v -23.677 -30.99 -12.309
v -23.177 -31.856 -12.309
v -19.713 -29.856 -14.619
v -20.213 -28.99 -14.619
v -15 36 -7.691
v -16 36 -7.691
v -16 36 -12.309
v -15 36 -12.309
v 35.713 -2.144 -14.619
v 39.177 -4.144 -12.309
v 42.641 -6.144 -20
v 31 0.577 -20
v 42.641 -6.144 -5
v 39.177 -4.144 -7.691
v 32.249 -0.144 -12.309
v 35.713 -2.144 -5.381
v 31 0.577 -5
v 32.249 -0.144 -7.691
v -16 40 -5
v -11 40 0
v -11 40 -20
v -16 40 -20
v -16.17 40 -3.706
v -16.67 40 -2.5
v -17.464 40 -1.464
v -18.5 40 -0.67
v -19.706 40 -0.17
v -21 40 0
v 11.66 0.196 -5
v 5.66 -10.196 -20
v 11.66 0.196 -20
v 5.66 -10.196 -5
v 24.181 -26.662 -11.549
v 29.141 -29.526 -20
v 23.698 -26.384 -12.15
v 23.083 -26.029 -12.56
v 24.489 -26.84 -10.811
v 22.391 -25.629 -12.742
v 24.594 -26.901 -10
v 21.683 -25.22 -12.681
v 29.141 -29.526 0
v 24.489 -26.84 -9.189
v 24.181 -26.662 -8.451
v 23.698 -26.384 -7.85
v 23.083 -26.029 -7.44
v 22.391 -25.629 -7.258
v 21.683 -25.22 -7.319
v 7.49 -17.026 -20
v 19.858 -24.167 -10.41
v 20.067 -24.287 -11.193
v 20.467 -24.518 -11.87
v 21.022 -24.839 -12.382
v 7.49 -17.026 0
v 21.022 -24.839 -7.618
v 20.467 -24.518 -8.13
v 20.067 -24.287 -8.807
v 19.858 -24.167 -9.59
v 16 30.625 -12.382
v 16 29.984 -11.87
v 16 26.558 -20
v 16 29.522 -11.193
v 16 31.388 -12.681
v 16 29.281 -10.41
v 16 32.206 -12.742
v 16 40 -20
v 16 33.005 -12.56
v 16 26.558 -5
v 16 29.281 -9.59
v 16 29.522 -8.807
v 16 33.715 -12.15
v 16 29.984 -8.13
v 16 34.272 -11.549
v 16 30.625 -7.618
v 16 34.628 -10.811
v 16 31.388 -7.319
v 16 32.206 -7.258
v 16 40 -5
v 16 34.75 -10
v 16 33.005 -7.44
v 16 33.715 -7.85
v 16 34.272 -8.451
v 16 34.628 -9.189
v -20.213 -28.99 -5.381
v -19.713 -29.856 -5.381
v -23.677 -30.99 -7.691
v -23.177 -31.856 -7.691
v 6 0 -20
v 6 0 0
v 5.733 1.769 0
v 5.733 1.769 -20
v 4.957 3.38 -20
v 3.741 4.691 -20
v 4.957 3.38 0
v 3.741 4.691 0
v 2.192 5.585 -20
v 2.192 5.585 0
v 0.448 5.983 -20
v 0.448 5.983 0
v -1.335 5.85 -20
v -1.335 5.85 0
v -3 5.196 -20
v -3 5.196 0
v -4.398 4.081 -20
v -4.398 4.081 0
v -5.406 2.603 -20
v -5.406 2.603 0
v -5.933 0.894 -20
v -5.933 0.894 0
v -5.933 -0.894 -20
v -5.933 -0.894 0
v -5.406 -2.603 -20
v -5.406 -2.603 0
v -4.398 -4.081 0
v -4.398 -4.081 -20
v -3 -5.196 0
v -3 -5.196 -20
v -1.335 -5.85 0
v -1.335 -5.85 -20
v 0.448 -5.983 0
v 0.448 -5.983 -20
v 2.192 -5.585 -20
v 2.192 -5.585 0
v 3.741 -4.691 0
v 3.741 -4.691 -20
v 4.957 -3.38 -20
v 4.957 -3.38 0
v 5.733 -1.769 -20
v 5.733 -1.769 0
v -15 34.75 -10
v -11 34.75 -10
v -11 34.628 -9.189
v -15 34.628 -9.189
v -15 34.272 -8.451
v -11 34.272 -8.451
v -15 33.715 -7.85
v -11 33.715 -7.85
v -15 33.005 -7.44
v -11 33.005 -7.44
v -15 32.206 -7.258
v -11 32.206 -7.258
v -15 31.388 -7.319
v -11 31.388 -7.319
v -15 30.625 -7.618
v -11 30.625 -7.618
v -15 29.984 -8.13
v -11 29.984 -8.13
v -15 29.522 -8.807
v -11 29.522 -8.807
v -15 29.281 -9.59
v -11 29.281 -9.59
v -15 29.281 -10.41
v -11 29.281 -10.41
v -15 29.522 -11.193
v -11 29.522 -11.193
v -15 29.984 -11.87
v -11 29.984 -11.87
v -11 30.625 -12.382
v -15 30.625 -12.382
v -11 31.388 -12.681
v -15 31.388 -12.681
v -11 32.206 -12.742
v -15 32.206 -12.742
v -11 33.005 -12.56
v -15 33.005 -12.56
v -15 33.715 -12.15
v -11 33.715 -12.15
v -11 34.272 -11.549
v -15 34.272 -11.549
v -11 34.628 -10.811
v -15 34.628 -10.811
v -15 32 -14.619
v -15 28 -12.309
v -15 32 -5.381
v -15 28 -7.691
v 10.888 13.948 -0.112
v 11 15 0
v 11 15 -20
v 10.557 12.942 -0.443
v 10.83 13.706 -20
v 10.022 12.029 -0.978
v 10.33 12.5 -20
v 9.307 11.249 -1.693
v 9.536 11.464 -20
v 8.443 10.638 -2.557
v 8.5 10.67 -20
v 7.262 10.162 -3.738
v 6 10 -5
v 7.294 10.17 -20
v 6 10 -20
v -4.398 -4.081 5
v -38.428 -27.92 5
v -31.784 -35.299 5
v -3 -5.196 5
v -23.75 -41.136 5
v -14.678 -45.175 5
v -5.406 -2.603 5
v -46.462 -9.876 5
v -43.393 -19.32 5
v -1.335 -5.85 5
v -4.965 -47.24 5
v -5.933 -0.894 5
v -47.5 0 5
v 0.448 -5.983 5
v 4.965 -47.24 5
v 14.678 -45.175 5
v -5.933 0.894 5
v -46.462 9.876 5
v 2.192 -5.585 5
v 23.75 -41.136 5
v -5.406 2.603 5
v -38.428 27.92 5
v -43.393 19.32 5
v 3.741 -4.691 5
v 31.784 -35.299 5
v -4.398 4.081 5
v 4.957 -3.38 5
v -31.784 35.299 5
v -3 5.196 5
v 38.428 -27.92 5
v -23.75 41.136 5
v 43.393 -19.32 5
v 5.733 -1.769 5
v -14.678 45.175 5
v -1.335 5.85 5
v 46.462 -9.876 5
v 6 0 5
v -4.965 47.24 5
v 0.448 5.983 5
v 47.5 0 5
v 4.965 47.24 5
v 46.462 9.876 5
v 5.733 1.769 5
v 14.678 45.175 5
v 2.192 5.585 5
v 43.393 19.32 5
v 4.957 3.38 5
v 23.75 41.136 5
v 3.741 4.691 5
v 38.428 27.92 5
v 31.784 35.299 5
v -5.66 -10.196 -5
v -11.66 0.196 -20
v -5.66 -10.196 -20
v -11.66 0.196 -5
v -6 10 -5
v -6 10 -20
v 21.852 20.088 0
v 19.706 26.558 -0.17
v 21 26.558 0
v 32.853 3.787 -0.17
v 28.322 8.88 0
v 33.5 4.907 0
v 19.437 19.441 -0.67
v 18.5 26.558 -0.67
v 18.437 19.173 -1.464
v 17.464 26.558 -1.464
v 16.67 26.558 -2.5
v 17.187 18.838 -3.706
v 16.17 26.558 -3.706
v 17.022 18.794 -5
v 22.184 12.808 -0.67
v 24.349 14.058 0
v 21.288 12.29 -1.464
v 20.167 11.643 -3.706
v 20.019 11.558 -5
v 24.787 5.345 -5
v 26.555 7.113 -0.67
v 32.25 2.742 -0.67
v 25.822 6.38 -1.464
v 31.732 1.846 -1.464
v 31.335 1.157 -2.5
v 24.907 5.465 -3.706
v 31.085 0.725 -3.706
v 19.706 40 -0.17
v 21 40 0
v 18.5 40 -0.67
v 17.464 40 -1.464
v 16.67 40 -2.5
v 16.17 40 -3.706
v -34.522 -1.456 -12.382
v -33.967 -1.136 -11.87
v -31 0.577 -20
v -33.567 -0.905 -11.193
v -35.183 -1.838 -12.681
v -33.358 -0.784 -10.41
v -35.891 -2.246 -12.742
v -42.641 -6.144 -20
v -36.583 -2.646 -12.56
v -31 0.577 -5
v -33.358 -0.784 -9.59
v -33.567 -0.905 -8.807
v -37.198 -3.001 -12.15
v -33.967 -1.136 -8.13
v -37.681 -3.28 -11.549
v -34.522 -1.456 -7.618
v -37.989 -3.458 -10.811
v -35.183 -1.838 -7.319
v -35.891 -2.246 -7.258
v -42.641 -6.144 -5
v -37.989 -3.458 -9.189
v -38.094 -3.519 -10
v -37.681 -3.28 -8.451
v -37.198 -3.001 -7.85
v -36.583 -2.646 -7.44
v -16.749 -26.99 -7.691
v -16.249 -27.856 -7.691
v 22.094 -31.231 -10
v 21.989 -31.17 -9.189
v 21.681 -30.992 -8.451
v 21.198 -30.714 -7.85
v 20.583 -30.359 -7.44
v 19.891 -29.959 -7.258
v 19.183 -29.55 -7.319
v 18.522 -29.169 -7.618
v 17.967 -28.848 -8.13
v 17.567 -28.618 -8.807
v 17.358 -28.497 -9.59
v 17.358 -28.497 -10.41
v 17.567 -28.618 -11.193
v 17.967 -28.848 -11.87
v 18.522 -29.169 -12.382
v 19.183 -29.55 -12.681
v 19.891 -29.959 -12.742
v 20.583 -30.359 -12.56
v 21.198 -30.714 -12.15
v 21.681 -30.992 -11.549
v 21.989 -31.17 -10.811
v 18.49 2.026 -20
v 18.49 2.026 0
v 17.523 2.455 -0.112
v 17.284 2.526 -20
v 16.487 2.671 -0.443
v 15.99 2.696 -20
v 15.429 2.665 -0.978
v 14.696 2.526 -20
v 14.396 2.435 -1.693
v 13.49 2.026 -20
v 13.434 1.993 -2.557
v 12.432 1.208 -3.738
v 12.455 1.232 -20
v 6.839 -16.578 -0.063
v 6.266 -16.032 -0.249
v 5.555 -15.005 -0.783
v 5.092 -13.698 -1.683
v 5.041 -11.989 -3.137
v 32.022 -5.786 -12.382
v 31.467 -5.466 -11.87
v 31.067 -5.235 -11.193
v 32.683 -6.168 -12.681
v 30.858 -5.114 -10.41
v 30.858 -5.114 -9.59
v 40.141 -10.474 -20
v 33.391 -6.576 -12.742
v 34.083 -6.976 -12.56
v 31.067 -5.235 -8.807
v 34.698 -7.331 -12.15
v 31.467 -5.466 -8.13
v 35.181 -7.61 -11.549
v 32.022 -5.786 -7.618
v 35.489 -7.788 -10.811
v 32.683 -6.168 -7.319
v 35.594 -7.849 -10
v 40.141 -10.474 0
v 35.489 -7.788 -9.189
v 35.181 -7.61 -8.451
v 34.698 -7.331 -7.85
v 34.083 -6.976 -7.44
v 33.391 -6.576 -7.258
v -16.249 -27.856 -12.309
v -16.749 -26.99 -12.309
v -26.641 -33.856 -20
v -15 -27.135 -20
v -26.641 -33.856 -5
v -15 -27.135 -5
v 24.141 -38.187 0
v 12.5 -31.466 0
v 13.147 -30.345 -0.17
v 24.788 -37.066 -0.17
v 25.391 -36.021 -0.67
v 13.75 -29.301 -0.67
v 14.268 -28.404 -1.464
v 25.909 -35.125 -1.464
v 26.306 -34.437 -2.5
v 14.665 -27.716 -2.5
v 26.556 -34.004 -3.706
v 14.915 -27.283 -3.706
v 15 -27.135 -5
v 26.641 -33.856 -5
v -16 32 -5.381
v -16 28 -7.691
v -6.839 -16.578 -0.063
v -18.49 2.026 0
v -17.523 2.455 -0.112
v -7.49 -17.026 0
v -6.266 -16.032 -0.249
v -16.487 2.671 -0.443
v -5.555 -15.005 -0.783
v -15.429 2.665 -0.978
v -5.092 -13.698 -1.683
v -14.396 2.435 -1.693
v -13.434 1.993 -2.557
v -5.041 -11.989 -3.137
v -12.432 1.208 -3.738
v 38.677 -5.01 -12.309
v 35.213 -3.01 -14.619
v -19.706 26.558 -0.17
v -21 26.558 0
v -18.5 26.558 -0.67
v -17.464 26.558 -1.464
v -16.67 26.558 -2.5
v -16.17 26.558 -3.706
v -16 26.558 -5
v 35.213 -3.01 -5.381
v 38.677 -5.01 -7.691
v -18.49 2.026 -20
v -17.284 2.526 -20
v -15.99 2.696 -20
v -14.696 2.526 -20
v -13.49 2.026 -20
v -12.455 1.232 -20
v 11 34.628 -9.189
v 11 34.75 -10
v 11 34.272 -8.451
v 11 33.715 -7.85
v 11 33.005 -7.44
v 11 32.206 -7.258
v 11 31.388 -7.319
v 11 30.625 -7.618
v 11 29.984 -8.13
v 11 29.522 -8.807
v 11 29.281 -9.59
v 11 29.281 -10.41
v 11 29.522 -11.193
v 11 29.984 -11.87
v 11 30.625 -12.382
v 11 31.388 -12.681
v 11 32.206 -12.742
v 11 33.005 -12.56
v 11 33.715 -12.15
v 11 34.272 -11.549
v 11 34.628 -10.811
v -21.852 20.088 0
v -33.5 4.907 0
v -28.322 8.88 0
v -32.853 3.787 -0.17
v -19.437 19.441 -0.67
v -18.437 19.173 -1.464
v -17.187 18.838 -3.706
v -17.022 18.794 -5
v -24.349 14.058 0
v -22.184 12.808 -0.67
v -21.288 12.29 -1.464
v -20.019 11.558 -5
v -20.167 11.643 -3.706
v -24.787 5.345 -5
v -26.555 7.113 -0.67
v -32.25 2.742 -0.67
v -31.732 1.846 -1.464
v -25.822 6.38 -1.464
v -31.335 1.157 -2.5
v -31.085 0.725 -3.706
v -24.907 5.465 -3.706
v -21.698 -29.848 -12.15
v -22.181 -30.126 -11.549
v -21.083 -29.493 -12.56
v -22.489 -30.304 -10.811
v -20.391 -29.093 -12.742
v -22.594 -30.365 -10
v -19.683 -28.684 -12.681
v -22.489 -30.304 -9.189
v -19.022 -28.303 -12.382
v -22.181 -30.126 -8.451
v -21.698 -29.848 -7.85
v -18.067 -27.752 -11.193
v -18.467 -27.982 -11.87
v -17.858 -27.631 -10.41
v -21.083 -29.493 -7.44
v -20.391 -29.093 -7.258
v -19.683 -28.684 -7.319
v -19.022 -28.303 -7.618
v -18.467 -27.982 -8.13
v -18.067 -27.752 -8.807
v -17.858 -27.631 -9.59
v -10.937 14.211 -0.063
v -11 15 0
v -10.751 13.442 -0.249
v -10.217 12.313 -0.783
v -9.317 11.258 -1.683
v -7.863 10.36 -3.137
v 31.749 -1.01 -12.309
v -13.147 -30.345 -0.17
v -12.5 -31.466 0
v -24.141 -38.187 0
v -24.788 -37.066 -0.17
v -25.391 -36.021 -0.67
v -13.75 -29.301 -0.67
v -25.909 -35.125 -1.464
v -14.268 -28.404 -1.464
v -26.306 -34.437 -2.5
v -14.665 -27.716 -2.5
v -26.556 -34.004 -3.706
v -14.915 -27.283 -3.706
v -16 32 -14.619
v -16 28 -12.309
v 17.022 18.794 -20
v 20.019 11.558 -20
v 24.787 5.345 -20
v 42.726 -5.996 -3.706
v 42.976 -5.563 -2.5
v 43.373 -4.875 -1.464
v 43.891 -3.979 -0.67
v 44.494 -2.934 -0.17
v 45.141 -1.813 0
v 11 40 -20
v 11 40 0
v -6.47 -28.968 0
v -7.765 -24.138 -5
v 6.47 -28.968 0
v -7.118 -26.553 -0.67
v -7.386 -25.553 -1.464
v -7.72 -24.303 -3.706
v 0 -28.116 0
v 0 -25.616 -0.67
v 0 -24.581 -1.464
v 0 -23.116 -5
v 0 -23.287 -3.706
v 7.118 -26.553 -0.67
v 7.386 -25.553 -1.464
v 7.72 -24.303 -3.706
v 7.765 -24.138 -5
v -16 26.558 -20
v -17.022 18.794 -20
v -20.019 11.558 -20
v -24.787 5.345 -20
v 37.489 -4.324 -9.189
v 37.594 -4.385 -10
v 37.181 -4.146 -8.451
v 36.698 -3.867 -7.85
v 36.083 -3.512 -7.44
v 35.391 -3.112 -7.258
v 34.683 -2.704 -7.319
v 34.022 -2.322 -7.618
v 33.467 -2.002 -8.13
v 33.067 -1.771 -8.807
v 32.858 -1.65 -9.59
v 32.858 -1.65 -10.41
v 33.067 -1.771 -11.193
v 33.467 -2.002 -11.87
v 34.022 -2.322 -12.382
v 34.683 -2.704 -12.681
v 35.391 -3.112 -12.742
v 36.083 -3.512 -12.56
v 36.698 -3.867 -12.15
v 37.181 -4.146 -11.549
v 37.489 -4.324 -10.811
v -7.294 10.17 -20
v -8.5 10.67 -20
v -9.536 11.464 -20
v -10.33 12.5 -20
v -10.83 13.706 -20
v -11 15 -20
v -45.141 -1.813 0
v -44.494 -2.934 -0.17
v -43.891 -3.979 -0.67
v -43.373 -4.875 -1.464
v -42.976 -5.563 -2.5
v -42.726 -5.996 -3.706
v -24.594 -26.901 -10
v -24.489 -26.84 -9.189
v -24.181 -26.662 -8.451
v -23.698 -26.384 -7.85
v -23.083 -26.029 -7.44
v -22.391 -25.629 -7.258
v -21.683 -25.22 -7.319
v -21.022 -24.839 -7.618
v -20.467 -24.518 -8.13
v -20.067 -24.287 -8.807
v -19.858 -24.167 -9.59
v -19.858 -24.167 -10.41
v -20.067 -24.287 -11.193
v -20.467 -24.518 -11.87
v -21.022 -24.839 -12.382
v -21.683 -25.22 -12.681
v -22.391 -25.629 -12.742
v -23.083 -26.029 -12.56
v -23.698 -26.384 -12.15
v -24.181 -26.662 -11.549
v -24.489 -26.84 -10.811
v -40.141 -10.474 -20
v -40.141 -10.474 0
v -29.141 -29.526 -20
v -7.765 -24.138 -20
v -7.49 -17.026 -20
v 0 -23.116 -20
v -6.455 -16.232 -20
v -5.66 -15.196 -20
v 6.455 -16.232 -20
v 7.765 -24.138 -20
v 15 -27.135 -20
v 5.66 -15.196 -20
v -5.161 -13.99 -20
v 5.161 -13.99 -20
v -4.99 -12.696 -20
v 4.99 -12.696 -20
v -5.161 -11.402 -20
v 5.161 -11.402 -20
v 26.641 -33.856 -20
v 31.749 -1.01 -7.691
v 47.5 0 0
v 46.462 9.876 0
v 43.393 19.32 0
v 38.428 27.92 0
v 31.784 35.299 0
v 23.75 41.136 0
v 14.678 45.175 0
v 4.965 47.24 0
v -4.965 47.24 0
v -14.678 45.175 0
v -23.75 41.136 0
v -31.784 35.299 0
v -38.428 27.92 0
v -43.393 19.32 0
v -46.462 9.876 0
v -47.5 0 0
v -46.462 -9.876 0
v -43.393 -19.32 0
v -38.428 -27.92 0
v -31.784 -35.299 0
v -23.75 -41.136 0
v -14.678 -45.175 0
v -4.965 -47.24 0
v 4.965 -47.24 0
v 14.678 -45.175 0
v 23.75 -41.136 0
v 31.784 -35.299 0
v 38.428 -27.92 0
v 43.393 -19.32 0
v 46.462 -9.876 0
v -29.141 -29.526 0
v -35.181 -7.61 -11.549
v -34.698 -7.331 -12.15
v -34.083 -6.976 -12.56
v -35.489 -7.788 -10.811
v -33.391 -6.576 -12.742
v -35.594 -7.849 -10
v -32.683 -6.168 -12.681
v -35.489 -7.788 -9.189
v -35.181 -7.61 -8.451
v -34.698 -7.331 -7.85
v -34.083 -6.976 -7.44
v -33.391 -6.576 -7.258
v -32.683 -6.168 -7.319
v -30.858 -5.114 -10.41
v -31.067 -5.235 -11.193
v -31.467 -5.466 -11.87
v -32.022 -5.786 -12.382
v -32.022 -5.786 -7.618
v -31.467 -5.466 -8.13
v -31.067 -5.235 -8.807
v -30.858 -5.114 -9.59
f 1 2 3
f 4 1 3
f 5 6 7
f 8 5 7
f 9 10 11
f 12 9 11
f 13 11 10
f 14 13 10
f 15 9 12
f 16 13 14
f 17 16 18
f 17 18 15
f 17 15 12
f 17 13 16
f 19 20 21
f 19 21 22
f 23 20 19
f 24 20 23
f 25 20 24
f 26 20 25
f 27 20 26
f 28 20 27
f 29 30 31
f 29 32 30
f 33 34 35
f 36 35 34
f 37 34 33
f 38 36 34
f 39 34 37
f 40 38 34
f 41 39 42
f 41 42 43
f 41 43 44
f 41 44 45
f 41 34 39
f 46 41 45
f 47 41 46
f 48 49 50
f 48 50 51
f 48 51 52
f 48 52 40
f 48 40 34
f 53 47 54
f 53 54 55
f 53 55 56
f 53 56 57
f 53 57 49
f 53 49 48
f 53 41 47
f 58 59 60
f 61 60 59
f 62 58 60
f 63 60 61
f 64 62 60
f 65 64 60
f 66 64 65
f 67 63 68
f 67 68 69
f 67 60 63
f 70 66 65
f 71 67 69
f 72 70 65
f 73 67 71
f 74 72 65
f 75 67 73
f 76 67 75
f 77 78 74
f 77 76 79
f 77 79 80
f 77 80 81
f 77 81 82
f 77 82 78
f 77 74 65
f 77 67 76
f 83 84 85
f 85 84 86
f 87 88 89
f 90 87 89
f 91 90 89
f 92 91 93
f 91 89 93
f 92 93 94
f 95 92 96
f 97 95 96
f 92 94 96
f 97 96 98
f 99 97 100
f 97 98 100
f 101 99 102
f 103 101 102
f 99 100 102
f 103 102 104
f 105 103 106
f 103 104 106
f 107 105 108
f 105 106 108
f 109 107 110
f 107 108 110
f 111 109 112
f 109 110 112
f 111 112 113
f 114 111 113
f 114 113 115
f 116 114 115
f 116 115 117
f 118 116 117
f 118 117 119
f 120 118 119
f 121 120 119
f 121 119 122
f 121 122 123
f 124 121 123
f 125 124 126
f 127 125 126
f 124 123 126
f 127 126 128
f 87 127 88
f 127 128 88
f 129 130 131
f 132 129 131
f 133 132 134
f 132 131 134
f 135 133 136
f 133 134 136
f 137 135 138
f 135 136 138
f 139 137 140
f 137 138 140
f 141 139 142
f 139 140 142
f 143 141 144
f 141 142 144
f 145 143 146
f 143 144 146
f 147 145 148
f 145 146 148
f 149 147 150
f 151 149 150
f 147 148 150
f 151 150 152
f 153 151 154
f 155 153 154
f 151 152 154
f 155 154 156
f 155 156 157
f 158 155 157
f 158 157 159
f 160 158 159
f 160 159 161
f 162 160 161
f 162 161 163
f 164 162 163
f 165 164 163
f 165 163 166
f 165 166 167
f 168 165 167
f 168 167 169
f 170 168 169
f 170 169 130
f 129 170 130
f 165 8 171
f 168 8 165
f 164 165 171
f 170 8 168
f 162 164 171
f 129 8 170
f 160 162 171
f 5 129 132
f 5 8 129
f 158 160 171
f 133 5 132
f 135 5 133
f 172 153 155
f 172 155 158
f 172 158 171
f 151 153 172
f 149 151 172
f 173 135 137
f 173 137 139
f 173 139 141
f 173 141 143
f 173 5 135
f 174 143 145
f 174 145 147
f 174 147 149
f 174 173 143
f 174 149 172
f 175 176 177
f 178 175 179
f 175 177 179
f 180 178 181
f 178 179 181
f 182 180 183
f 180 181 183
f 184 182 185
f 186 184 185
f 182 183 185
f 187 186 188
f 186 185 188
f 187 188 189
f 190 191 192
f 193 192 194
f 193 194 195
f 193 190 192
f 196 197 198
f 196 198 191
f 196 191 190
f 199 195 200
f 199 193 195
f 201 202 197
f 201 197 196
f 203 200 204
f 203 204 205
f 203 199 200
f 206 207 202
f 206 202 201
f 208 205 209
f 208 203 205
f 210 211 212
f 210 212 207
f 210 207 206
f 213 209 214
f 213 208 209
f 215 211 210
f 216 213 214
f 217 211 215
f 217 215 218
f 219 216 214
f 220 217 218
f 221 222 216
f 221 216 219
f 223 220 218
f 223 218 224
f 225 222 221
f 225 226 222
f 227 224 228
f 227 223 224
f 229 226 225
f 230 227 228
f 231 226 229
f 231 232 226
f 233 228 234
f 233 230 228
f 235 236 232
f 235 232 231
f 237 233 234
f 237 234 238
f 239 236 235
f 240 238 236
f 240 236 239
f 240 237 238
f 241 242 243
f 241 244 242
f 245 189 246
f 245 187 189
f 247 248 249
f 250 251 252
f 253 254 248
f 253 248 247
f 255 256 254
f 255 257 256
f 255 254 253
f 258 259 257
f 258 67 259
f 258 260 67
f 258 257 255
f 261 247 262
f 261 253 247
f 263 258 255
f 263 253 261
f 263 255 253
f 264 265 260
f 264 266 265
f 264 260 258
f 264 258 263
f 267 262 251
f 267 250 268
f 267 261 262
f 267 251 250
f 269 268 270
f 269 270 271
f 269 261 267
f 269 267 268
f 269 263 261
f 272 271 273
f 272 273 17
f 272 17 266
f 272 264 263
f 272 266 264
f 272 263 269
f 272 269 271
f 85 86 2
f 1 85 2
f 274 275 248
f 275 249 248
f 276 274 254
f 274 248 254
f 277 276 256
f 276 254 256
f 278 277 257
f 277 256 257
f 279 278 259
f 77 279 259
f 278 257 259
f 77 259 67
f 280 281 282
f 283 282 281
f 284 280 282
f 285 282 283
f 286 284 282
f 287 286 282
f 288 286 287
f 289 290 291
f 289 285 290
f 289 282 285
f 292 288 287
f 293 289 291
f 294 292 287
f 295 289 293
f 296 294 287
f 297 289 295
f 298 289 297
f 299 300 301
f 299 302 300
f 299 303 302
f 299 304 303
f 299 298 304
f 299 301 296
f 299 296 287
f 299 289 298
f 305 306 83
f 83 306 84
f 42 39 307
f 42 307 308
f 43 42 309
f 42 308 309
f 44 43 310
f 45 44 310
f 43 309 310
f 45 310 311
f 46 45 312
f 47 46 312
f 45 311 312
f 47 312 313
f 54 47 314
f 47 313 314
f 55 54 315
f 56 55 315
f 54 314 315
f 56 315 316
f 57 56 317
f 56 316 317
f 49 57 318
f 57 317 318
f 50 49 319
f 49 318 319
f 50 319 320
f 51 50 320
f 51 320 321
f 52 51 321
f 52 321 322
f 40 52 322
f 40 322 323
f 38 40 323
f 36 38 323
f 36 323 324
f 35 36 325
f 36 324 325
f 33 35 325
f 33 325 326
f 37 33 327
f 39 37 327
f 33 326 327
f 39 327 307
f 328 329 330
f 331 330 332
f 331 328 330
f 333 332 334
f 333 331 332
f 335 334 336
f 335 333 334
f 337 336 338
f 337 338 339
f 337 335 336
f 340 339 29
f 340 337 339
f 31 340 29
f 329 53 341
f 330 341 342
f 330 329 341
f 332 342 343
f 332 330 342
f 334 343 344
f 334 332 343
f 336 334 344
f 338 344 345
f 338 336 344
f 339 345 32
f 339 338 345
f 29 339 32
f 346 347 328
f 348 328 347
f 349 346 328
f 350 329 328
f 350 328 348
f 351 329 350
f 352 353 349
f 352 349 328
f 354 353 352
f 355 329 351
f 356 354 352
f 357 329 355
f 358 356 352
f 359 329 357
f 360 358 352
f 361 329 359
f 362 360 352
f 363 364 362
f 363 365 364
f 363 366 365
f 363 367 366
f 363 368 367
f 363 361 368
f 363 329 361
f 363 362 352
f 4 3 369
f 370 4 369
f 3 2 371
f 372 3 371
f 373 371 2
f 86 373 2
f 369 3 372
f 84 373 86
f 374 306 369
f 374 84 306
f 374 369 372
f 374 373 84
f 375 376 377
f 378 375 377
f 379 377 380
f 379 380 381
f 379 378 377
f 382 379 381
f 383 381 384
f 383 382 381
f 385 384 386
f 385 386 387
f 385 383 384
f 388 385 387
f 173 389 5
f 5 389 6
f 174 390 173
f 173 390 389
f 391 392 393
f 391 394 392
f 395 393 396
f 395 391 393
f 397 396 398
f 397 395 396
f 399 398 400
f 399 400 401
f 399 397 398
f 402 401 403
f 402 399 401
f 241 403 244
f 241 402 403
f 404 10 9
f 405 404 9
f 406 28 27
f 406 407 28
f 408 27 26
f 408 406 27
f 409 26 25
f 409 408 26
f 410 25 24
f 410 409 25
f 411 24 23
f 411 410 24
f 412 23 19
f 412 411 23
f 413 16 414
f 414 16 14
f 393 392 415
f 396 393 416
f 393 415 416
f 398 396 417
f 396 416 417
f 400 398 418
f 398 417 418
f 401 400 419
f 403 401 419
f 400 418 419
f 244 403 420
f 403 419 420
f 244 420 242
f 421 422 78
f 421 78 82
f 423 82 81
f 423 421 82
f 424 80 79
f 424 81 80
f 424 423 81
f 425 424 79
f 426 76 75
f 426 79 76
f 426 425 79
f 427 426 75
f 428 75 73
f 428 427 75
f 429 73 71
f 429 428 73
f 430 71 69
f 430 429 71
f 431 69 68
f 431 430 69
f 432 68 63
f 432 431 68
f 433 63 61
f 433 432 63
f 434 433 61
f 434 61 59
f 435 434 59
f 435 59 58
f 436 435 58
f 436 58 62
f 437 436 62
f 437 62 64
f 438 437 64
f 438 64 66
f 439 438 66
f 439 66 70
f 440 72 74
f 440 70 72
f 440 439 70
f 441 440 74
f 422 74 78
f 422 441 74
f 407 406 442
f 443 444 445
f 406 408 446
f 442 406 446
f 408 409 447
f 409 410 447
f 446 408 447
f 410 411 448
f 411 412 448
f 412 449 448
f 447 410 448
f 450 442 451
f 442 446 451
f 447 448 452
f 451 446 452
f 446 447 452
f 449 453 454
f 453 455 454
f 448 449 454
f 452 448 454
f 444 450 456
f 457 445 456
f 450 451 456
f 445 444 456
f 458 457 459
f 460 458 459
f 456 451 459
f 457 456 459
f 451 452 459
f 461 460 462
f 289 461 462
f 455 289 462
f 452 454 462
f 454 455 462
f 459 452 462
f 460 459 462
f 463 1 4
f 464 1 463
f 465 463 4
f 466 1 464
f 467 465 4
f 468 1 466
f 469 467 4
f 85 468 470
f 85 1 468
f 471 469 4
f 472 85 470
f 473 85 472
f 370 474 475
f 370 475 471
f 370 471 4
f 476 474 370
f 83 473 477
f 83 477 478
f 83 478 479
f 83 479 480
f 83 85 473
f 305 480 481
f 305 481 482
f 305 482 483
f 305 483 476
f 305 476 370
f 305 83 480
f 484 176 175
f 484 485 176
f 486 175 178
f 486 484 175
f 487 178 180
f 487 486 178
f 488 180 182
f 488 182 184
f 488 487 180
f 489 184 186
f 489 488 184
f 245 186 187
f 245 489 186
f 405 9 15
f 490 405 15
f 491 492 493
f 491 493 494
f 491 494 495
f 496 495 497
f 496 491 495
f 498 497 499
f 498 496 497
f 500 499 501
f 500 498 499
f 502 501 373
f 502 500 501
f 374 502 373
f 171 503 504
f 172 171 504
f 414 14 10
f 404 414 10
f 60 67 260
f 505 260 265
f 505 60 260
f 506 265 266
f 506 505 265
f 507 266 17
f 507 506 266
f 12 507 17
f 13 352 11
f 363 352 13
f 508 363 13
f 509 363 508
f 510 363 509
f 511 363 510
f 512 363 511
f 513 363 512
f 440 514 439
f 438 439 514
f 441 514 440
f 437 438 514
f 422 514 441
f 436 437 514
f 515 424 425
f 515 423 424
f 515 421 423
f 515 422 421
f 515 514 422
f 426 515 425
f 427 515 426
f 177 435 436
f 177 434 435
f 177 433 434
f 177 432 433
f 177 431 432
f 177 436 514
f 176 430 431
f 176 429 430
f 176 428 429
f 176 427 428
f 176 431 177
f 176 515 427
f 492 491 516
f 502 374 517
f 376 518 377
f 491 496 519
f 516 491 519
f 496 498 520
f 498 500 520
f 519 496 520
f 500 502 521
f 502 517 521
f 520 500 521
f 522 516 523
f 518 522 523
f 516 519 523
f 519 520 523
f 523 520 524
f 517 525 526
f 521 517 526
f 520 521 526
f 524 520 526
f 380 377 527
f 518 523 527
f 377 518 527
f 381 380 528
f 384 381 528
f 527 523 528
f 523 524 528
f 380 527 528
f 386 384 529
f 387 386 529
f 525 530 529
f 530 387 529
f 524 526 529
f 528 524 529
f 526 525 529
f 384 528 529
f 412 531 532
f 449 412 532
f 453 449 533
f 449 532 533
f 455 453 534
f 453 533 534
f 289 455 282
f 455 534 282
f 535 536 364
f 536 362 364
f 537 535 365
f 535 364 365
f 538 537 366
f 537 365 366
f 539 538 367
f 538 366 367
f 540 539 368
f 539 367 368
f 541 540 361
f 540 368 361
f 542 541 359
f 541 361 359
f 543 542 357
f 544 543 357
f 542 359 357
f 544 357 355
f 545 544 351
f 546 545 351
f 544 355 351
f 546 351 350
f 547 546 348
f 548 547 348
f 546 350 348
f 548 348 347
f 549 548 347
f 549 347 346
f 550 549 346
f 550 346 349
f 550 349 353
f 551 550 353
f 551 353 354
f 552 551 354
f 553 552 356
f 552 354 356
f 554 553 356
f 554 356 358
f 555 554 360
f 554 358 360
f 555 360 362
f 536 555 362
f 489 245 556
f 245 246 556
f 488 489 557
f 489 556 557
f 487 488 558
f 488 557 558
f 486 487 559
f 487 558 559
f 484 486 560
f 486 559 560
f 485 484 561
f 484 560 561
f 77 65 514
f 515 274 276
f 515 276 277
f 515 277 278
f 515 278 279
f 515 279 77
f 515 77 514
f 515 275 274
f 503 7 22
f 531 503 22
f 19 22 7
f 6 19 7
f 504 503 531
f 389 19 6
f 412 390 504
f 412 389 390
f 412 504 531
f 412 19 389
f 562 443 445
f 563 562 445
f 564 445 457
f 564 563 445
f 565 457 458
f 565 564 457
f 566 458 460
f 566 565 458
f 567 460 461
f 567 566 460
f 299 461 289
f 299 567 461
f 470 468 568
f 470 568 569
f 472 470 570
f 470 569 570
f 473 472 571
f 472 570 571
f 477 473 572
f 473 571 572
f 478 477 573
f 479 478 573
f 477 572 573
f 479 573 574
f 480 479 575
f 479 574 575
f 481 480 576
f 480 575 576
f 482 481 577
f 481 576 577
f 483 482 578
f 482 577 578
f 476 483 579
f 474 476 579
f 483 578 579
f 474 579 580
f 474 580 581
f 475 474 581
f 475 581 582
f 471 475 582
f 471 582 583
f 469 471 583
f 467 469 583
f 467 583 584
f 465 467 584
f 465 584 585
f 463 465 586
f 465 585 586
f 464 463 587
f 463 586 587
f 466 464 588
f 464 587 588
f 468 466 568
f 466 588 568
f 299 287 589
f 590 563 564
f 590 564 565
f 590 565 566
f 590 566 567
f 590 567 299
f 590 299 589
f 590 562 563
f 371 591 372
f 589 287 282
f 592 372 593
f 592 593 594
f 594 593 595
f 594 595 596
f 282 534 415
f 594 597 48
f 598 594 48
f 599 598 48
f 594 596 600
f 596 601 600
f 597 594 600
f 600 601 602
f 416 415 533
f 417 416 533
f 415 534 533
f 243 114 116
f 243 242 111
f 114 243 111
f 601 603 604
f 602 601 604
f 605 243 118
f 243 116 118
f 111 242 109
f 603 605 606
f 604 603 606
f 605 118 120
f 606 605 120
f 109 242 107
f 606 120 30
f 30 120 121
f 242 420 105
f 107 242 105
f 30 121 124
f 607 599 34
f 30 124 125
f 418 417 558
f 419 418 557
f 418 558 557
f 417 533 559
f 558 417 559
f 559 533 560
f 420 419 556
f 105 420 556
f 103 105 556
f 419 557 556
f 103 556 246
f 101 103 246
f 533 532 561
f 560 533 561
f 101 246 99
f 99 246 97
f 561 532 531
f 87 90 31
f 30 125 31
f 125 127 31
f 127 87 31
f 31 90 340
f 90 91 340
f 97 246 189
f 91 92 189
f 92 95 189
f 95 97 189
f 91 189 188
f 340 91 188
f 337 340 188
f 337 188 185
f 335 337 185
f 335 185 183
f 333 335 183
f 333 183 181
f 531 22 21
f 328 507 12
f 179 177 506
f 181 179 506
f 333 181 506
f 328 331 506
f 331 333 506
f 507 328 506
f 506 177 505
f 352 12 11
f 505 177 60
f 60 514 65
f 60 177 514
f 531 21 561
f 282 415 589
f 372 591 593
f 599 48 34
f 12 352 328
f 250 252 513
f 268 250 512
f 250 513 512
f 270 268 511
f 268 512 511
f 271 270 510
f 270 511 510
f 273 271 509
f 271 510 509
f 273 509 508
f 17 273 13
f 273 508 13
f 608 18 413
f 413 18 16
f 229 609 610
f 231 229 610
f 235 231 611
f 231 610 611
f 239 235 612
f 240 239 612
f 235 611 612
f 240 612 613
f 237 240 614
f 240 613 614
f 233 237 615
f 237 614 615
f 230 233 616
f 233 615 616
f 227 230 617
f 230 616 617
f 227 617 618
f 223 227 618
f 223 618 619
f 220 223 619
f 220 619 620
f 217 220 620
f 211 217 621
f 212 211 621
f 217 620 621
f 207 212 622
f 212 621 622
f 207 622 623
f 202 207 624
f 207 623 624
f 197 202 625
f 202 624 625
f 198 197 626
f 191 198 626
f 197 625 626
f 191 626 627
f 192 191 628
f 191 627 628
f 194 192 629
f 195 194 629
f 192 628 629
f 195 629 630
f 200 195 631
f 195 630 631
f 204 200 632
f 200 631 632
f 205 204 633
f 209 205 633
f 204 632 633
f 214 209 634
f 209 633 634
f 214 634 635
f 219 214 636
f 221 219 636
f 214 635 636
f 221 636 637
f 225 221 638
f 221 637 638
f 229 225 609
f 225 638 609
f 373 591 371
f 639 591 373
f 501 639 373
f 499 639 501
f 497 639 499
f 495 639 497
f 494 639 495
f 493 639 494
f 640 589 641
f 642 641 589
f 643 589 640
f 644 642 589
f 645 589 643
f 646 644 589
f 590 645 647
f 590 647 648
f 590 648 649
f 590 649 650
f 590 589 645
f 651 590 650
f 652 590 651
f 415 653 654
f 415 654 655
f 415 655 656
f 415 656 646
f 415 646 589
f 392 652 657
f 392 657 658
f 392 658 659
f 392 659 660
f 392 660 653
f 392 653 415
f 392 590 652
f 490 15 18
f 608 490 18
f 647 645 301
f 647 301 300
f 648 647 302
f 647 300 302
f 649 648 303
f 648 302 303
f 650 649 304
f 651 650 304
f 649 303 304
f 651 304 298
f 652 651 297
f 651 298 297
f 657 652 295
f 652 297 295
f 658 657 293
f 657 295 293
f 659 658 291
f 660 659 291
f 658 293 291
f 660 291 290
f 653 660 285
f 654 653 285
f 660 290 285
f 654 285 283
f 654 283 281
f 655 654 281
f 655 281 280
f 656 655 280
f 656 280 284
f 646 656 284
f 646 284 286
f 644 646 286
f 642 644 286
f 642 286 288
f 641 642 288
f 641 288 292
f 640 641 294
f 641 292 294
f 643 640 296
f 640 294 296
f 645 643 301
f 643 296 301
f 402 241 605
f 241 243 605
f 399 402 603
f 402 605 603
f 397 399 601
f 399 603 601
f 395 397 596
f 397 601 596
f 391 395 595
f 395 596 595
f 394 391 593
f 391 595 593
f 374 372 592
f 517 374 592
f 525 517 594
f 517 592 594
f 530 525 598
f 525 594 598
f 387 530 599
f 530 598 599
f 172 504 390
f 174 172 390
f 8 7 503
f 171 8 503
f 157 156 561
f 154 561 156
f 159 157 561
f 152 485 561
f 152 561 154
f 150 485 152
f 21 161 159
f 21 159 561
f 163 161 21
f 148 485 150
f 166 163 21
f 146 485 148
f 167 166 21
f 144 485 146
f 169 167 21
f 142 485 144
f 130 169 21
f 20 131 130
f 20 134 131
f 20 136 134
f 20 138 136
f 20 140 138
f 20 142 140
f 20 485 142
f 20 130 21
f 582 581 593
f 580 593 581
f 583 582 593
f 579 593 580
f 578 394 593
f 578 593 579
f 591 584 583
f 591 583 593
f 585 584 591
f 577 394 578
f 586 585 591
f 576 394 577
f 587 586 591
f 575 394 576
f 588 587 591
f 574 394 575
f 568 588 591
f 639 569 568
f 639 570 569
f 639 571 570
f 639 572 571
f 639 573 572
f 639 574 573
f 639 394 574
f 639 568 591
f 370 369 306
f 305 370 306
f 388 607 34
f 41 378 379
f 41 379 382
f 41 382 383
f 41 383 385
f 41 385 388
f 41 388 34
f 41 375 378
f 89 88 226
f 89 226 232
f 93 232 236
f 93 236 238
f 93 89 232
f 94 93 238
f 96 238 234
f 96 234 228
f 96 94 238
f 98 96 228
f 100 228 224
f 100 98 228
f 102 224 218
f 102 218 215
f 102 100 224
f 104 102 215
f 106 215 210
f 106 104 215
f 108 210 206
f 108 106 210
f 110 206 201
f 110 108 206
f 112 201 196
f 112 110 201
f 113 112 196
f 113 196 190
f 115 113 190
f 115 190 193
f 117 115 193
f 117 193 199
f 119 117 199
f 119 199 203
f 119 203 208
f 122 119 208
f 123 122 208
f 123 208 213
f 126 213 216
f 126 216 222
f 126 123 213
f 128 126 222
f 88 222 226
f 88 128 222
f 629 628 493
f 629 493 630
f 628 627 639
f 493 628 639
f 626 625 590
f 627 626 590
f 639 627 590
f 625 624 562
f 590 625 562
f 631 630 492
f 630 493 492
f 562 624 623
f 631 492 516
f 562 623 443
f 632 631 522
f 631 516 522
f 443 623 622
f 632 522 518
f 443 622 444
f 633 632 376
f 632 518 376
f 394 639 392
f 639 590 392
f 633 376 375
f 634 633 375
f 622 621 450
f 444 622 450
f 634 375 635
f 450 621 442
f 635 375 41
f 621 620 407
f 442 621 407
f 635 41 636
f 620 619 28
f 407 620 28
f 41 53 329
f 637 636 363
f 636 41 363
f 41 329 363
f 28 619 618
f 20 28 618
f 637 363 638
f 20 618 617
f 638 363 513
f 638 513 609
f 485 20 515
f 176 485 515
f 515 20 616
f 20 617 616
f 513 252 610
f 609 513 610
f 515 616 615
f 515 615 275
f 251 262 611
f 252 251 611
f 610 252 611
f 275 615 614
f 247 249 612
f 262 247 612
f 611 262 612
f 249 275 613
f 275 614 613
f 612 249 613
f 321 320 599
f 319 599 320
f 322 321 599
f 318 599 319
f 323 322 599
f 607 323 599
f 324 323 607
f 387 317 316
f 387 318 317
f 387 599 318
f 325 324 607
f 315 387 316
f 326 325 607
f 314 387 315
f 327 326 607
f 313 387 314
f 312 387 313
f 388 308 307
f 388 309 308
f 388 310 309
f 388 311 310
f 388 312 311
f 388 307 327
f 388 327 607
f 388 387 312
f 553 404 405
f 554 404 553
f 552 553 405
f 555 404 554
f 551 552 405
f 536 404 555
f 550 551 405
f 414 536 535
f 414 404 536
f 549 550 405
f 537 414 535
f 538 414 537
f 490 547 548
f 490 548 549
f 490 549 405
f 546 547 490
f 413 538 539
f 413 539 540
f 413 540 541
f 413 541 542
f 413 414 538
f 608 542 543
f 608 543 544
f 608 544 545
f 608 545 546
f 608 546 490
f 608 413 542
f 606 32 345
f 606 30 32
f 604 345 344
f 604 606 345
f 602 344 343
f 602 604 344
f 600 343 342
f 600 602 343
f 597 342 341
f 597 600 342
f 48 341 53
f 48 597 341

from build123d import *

# Parameters (mm, degrees)
SKETCH_R             = 47.5
SKETCH_R_2           = 6
PAD_DEPTH            = 5
SKETCH001_R          = 6
PAD001_DEPTH         = 20
FILLET_R             = 30
POCKET_DEPTH         = 1
SKETCH003_R          = 2.75
POCKET001_DEPTH      = 320.814007
POCKET001_DEPTH_BACK = 320.814007
POLARPATTERN_COUNT   = 3
FILLET001_R          = 5


with BuildPart() as part:
    # Sketch → Pad (new body)
    with BuildSketch(Plane.XY):
        Circle(SKETCH_R)
        Circle(SKETCH_R_2, mode=Mode.SUBTRACT)
    extrude(amount=PAD_DEPTH)

    # Sketch001 → Pad001 (join)
    with BuildSketch(Plane.XY):
        Polygon((16, 9.237604), (16, 40), (11, 40), (11, 10), (-11, 10), (-11, 40), (-16, 40), (-16, 9.237604), (-42.641016, -6.143594), (-40.141016, -10.473721), (-14.160254, 4.526279), (-3.160254, -14.526279), (-29.141016, -29.526279), (-26.641016, -33.856406), (0, -18.475209), (26.641016, -33.856406), (29.141016, -29.526279), (3.160254, -14.526279), (14.160254, 4.526279), (40.141016, -10.473721), (42.641016, -6.143594), align=None)
        Circle(SKETCH001_R, mode=Mode.SUBTRACT)
    extrude(amount=-PAD001_DEPTH)

    # Fillet
    fillet_edges = [part.edges().sort_by_distance(p)[0] for p in [
        (16, 9.237604, -10),
        (-16, 9.237604, -10),
        (0, -18.475209, -10),
    ]]
    fillet(fillet_edges, radius=FILLET_R)

    # Sketch002 (on Face14 of Fillet) → Pocket (cut)
    with BuildSketch(Plane(origin=(-16, 0, 0), x_dir=(0, -1, 0), z_dir=(-1, 0, 0))):
        Polygon((-28, -12.309401), (-28, -7.690599), (-32, -5.381198), (-36, -7.690599), (-36, -12.309401), (-32, -14.618802), align=None)
    pocket = extrude(amount=-POCKET_DEPTH, mode=Mode.SUBTRACT)

    # Sketch003 → Pocket001 (cut, two sides)
    with BuildSketch(Plane.YZ) as pocket001_sk:
        with Locations((32, -10)):
            Circle(SKETCH003_R)
    pocket001 = extrude(amount=-POCKET001_DEPTH, mode=Mode.SUBTRACT) + extrude(pocket001_sk.sketch, amount=POCKET001_DEPTH_BACK, mode=Mode.SUBTRACT)

    # PolarPattern: Pocket, Pocket001 ×3 about axis
    polarpattern_axis = Axis((0, 0, 0), (0, 0, 1))
    for i in range(1, POLARPATTERN_COUNT):
        add(pocket.rotate(polarpattern_axis, i * 360 / POLARPATTERN_COUNT), mode=Mode.SUBTRACT)
        add(pocket001.rotate(polarpattern_axis, i * 360 / POLARPATTERN_COUNT), mode=Mode.SUBTRACT)

    # Fillet001
    fillet001_edges = [part.edges().sort_by_distance(p)[0] for p in [
        (14.160254, 4.526279, -10),
        (3.160254, -14.526279, -10),
        (11, 10, -10),
        (-11, 10, -10),
        (-14.160254, 4.526279, -10),
        (-3.160254, -14.526279, -10),
        (-8.660254, -5, 0),
        (0, 10, 0),
        (8.660254, -5, 0),
        (20.019238, 11.558112, 0),
        (-20.019238, 11.558112, 0),
        (0, -23.116225, 0),
    ]]
    fillet(fillet001_edges, radius=FILLET001_R)


solid = part.part
